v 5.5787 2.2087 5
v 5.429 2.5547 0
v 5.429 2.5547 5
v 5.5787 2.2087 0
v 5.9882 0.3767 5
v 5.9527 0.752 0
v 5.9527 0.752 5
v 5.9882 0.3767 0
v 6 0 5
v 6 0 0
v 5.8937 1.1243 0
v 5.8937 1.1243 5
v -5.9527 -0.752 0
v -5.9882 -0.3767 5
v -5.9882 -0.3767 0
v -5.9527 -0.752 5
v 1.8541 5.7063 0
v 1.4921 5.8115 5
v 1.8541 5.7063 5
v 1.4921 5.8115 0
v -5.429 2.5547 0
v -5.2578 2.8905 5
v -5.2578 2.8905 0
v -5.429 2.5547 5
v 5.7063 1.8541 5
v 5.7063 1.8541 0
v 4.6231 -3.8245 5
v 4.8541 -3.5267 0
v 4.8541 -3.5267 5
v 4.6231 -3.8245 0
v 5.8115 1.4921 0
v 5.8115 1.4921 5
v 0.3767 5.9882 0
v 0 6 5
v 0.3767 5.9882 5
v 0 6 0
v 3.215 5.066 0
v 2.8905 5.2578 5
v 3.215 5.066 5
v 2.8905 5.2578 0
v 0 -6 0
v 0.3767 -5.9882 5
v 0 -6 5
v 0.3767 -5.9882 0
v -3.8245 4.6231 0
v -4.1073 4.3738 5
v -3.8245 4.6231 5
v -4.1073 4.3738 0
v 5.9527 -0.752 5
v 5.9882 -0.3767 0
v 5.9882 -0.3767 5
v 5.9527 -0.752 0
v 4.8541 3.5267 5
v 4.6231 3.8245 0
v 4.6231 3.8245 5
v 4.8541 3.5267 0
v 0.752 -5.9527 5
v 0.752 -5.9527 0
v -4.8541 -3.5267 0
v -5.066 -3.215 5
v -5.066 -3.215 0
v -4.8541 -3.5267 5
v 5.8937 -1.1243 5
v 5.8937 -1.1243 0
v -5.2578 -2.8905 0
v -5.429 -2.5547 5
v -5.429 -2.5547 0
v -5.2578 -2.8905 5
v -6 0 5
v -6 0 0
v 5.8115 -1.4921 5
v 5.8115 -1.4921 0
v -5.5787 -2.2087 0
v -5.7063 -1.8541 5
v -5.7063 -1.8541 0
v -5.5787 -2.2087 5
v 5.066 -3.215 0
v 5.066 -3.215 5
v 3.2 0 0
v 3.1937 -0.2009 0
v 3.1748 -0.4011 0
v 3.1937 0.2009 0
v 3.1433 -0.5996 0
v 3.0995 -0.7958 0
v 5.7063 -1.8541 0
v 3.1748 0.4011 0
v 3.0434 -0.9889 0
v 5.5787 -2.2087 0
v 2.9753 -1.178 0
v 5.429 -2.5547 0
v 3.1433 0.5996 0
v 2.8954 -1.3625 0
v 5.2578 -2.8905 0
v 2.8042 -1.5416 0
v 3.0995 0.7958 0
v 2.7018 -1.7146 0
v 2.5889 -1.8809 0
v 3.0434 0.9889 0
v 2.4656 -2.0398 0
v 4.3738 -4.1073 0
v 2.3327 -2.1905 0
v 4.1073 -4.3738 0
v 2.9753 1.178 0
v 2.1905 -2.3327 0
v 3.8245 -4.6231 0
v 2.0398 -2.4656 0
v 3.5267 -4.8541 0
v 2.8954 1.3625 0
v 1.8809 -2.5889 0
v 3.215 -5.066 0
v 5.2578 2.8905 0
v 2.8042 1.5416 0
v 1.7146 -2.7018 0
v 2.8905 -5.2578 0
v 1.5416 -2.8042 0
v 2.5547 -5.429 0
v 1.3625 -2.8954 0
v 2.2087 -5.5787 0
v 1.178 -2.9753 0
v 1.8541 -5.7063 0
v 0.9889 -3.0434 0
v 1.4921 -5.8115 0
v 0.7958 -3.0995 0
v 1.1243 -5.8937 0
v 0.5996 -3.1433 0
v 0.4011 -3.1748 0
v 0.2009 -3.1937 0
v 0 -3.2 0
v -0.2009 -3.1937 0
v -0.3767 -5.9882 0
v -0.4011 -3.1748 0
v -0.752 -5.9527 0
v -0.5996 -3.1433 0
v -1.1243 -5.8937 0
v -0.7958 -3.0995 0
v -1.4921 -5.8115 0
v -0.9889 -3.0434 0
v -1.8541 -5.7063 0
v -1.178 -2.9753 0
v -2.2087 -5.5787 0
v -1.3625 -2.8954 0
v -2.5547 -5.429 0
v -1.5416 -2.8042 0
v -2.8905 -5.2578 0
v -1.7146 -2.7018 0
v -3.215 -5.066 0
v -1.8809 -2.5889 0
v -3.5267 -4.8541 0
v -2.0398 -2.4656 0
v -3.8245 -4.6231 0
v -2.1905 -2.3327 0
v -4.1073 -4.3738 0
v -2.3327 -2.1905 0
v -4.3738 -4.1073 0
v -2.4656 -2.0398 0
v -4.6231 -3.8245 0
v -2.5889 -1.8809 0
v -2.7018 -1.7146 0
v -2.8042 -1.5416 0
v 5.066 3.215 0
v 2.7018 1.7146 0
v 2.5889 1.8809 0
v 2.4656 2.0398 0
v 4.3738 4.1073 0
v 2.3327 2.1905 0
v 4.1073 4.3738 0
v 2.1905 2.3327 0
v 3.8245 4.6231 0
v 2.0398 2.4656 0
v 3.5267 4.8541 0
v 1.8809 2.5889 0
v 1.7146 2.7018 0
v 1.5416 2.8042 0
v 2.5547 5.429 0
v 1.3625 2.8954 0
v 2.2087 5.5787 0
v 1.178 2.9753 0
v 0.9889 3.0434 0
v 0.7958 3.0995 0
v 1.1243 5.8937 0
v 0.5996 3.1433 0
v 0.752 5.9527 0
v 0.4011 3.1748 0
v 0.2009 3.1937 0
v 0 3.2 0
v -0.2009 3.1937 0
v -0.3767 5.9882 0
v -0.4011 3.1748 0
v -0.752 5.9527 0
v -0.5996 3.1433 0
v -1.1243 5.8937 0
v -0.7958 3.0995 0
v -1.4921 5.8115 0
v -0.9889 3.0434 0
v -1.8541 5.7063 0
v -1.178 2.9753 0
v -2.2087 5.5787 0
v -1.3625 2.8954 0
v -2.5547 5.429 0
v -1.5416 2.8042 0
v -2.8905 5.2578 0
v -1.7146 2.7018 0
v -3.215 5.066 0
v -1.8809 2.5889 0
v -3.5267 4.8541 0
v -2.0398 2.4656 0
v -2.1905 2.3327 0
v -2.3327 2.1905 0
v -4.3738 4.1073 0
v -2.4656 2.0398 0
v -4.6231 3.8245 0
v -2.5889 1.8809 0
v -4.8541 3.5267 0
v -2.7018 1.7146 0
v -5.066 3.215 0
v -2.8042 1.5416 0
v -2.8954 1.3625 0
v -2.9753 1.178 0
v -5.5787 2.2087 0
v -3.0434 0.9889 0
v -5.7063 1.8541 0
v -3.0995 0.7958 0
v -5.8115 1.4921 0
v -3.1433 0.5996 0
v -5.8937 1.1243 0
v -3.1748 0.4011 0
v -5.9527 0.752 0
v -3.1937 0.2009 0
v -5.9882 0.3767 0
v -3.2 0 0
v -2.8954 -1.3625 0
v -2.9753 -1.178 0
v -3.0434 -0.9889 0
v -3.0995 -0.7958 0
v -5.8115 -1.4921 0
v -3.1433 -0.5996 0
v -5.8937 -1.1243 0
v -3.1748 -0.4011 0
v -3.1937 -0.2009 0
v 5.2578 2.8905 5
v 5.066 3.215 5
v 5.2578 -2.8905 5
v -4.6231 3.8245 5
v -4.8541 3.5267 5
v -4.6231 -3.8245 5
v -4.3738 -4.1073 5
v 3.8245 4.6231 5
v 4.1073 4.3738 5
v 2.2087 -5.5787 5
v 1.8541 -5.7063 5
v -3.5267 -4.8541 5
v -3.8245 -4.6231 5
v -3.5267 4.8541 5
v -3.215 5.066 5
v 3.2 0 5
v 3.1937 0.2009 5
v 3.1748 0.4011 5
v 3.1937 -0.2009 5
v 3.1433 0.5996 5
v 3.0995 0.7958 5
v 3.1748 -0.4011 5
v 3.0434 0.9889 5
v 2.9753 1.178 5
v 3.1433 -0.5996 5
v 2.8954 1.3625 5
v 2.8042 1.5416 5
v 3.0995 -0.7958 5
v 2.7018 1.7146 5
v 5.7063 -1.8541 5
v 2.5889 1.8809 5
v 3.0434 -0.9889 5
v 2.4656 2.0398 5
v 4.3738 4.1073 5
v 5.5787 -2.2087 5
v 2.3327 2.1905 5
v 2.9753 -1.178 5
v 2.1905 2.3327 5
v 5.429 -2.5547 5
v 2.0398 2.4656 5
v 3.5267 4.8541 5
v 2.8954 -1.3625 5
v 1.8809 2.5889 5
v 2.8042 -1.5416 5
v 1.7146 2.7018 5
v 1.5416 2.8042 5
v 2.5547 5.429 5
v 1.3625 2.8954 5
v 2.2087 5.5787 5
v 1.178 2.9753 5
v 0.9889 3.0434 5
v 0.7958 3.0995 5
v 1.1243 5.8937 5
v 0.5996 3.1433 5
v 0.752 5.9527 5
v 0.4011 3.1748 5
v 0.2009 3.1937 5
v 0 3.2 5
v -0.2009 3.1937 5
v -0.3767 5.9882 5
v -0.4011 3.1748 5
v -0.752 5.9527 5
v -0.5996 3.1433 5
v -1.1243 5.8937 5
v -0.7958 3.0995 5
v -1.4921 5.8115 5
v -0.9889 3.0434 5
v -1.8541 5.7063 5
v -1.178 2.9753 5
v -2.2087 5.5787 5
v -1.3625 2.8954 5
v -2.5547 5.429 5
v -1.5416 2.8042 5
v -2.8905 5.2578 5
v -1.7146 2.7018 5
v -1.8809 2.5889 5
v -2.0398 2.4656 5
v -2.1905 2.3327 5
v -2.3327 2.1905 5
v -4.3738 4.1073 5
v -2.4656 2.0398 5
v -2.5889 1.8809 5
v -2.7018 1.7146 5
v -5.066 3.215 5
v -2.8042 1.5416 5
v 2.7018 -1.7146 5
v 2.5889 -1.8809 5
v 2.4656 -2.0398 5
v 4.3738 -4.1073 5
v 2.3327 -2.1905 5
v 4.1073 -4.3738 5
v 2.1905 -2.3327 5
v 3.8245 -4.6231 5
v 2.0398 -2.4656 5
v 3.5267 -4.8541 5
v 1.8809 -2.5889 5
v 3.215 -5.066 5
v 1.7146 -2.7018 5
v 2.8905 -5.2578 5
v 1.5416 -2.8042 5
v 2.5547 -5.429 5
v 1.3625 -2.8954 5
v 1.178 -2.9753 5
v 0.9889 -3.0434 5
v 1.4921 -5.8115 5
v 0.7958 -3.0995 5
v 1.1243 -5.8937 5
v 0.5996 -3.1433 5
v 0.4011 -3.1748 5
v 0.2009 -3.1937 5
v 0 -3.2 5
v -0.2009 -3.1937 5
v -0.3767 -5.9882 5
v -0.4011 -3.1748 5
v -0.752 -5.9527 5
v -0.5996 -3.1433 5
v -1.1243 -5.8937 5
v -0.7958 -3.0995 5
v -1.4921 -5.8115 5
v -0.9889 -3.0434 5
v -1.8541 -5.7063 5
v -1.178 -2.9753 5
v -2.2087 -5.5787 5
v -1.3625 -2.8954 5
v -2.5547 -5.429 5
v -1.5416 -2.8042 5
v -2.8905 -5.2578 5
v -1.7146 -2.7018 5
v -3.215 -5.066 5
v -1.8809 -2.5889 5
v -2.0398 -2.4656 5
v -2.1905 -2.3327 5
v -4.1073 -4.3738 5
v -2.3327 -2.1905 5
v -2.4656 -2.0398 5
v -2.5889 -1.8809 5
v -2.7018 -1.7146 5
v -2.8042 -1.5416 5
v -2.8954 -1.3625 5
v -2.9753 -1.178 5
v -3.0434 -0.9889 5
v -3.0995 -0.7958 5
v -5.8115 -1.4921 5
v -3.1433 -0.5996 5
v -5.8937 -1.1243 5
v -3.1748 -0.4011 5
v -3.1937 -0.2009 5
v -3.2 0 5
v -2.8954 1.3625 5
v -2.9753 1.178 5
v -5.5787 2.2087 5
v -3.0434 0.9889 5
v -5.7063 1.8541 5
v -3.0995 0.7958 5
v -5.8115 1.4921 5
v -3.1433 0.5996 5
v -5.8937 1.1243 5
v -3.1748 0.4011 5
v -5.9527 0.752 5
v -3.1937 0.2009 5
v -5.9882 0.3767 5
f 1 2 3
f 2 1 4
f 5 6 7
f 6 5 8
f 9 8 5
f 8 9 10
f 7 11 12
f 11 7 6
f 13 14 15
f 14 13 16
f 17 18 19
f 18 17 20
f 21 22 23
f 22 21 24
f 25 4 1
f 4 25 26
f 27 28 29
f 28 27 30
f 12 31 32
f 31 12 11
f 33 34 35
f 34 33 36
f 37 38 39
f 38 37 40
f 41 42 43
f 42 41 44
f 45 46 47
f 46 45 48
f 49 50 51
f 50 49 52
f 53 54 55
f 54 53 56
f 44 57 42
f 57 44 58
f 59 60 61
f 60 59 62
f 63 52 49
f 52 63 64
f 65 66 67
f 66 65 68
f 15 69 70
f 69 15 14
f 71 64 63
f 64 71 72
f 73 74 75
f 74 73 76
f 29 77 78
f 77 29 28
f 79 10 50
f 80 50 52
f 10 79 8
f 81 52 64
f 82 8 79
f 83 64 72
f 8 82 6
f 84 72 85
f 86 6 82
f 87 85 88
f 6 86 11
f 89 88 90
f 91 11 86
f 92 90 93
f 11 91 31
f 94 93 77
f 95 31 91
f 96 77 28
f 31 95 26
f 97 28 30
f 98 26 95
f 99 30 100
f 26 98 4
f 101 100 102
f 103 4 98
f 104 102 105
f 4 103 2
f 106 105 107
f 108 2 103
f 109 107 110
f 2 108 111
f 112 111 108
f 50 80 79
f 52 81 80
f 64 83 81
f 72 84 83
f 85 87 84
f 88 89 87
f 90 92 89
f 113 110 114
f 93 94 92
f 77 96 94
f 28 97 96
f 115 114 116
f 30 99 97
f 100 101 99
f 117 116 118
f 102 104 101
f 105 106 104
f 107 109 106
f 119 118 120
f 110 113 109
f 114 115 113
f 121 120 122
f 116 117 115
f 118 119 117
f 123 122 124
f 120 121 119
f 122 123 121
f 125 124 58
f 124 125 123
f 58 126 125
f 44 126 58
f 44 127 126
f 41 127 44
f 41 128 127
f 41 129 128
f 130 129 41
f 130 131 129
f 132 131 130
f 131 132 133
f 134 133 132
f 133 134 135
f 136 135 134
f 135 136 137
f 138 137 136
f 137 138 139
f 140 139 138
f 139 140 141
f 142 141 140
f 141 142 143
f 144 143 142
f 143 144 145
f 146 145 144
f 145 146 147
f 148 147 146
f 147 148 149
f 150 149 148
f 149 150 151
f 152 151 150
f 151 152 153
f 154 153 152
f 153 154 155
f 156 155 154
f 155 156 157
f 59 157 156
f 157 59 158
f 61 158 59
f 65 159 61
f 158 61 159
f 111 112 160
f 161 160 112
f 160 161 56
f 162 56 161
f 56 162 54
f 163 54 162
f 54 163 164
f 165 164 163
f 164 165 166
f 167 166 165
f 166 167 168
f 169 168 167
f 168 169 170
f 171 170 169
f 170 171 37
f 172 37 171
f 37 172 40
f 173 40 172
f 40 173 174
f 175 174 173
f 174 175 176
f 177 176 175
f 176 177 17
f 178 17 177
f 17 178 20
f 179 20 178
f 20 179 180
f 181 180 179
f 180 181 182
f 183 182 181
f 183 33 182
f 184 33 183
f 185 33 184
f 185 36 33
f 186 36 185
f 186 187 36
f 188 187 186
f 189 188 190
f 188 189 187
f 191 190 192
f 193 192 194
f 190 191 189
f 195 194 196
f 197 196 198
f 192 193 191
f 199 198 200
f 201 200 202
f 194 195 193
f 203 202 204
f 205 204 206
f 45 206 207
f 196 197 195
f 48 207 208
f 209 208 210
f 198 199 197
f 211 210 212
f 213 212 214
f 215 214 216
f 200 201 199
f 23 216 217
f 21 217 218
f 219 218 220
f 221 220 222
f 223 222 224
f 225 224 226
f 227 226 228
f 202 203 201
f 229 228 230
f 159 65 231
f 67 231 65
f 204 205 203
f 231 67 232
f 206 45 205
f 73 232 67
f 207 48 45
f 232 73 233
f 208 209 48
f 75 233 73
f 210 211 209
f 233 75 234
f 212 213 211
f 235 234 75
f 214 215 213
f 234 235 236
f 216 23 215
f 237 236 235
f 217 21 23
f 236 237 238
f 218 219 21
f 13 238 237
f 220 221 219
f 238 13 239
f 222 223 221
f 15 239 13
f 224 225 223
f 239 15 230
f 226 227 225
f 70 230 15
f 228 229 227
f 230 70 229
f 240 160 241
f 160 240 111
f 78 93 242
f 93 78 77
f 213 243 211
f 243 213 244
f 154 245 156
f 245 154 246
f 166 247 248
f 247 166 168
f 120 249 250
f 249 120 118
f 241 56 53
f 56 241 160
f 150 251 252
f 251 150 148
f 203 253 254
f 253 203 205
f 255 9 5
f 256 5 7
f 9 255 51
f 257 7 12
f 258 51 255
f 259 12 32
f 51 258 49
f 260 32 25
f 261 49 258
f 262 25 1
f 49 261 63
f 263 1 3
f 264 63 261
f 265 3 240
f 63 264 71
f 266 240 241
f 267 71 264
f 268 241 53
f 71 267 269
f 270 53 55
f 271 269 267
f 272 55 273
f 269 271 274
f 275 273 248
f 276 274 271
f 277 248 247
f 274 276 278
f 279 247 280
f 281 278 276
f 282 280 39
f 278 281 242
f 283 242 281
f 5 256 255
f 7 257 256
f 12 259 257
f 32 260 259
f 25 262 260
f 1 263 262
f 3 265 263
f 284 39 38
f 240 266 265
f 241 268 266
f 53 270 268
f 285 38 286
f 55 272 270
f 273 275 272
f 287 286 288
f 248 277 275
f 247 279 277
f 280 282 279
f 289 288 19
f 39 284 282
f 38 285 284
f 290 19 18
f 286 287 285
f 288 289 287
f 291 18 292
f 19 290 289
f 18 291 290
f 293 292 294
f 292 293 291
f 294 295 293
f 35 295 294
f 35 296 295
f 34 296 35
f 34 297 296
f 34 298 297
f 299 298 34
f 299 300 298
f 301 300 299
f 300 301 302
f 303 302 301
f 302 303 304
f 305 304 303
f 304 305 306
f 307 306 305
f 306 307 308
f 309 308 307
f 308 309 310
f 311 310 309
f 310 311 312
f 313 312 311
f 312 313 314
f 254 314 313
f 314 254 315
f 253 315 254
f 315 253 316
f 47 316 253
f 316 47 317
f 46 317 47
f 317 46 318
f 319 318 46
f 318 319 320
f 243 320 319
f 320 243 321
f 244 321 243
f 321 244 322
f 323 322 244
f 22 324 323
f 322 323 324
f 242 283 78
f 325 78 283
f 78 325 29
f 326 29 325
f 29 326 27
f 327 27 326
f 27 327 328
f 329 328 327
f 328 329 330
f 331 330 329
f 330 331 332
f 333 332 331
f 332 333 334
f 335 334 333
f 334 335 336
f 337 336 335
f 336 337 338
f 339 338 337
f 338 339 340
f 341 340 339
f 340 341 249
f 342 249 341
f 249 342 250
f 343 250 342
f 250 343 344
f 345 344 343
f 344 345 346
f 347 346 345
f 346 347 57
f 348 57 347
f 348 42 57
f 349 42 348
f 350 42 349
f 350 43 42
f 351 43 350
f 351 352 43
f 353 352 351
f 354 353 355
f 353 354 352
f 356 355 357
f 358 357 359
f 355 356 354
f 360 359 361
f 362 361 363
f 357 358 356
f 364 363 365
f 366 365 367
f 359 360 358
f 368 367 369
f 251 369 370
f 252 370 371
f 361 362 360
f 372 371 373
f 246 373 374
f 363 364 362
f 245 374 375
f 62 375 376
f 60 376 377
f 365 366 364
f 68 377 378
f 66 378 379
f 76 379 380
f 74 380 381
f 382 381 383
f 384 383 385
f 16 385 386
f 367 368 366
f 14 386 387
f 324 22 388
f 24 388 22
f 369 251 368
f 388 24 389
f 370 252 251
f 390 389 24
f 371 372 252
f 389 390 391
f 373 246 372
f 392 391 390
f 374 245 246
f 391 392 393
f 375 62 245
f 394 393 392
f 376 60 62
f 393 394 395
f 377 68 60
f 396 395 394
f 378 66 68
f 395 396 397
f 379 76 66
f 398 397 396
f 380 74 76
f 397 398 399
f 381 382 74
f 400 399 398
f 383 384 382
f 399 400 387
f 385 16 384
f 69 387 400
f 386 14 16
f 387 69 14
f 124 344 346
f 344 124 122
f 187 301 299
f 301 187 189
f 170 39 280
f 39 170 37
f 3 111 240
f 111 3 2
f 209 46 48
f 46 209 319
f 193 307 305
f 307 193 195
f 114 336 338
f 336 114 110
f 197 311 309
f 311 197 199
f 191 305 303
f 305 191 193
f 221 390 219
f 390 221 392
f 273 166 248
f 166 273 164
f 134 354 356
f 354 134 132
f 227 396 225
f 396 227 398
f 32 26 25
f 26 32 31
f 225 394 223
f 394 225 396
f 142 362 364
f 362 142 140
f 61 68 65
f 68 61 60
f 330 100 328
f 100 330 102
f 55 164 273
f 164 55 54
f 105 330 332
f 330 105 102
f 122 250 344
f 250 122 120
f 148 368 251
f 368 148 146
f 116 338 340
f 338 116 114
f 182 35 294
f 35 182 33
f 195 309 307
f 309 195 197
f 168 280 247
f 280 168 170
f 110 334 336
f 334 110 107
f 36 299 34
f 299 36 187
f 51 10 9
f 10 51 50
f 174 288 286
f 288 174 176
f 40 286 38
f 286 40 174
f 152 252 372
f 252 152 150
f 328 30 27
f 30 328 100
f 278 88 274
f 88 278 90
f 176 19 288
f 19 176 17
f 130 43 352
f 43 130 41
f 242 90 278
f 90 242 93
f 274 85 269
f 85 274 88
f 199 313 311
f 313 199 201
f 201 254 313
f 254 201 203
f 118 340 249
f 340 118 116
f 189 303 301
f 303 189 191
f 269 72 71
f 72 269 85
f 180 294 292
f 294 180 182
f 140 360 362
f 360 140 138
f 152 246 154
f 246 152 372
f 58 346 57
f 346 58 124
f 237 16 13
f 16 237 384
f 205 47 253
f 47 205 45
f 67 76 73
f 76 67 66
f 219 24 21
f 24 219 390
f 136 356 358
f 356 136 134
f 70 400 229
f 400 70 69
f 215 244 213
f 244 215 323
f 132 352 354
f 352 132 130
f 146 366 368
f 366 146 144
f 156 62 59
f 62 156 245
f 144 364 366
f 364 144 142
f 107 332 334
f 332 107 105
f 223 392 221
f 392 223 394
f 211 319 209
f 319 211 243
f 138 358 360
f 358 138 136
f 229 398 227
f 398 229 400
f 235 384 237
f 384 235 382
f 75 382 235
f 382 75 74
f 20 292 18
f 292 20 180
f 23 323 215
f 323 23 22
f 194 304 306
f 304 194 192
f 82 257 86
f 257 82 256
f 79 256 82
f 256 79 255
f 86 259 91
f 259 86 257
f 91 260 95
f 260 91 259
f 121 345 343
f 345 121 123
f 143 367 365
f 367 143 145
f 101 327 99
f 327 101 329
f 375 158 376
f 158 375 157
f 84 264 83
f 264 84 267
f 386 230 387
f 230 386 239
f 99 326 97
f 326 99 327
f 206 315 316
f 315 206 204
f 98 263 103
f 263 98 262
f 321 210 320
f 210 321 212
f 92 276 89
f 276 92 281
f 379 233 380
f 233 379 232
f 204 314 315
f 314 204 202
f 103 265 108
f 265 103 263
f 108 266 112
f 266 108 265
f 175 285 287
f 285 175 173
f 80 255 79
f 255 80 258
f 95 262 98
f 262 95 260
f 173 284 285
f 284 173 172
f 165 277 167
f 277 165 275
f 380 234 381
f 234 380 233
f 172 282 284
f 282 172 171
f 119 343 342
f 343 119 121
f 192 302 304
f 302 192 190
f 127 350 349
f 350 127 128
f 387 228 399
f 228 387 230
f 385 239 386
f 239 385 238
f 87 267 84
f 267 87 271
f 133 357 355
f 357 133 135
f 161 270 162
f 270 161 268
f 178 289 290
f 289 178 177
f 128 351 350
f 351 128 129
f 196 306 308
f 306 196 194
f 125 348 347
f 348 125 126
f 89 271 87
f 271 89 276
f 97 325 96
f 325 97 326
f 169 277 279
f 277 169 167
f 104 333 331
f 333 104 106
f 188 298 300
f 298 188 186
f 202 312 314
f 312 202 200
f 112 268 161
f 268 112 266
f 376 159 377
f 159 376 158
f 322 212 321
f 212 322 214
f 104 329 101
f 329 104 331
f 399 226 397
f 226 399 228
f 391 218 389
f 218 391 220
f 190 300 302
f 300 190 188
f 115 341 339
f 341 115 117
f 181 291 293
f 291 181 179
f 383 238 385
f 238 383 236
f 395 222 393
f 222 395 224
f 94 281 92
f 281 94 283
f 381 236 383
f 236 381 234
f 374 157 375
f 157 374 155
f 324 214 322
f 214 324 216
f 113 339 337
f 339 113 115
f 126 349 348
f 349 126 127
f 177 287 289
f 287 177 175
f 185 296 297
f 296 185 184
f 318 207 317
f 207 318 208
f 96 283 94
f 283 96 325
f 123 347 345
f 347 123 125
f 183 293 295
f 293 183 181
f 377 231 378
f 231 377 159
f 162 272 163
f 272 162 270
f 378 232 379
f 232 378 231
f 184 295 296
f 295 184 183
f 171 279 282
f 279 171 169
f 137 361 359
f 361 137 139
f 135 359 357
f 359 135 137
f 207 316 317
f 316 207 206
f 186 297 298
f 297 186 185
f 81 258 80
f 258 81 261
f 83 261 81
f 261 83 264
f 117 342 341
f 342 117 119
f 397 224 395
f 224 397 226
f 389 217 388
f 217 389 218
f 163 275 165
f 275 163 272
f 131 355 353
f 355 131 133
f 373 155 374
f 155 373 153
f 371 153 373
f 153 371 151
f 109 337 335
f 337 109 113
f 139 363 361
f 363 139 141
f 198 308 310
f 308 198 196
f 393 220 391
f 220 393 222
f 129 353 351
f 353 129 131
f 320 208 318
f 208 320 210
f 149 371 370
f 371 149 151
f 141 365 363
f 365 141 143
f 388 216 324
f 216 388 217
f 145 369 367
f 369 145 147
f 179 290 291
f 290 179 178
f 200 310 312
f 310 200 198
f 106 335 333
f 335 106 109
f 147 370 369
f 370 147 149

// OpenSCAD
difference(){
	union(){    
        
      translate([0,0,0]){
            rotate([0,0,0]){
                cylinder(h=5, r=6, $fn=100, center=false);
            }
        }
        

	}
	union() {
        
      translate([0,0,-1]){
            rotate([0,0,0]){
                cylinder(h=10, r=3.2, $fn=100, center=false);
            }
        }
        
        
	}
}
